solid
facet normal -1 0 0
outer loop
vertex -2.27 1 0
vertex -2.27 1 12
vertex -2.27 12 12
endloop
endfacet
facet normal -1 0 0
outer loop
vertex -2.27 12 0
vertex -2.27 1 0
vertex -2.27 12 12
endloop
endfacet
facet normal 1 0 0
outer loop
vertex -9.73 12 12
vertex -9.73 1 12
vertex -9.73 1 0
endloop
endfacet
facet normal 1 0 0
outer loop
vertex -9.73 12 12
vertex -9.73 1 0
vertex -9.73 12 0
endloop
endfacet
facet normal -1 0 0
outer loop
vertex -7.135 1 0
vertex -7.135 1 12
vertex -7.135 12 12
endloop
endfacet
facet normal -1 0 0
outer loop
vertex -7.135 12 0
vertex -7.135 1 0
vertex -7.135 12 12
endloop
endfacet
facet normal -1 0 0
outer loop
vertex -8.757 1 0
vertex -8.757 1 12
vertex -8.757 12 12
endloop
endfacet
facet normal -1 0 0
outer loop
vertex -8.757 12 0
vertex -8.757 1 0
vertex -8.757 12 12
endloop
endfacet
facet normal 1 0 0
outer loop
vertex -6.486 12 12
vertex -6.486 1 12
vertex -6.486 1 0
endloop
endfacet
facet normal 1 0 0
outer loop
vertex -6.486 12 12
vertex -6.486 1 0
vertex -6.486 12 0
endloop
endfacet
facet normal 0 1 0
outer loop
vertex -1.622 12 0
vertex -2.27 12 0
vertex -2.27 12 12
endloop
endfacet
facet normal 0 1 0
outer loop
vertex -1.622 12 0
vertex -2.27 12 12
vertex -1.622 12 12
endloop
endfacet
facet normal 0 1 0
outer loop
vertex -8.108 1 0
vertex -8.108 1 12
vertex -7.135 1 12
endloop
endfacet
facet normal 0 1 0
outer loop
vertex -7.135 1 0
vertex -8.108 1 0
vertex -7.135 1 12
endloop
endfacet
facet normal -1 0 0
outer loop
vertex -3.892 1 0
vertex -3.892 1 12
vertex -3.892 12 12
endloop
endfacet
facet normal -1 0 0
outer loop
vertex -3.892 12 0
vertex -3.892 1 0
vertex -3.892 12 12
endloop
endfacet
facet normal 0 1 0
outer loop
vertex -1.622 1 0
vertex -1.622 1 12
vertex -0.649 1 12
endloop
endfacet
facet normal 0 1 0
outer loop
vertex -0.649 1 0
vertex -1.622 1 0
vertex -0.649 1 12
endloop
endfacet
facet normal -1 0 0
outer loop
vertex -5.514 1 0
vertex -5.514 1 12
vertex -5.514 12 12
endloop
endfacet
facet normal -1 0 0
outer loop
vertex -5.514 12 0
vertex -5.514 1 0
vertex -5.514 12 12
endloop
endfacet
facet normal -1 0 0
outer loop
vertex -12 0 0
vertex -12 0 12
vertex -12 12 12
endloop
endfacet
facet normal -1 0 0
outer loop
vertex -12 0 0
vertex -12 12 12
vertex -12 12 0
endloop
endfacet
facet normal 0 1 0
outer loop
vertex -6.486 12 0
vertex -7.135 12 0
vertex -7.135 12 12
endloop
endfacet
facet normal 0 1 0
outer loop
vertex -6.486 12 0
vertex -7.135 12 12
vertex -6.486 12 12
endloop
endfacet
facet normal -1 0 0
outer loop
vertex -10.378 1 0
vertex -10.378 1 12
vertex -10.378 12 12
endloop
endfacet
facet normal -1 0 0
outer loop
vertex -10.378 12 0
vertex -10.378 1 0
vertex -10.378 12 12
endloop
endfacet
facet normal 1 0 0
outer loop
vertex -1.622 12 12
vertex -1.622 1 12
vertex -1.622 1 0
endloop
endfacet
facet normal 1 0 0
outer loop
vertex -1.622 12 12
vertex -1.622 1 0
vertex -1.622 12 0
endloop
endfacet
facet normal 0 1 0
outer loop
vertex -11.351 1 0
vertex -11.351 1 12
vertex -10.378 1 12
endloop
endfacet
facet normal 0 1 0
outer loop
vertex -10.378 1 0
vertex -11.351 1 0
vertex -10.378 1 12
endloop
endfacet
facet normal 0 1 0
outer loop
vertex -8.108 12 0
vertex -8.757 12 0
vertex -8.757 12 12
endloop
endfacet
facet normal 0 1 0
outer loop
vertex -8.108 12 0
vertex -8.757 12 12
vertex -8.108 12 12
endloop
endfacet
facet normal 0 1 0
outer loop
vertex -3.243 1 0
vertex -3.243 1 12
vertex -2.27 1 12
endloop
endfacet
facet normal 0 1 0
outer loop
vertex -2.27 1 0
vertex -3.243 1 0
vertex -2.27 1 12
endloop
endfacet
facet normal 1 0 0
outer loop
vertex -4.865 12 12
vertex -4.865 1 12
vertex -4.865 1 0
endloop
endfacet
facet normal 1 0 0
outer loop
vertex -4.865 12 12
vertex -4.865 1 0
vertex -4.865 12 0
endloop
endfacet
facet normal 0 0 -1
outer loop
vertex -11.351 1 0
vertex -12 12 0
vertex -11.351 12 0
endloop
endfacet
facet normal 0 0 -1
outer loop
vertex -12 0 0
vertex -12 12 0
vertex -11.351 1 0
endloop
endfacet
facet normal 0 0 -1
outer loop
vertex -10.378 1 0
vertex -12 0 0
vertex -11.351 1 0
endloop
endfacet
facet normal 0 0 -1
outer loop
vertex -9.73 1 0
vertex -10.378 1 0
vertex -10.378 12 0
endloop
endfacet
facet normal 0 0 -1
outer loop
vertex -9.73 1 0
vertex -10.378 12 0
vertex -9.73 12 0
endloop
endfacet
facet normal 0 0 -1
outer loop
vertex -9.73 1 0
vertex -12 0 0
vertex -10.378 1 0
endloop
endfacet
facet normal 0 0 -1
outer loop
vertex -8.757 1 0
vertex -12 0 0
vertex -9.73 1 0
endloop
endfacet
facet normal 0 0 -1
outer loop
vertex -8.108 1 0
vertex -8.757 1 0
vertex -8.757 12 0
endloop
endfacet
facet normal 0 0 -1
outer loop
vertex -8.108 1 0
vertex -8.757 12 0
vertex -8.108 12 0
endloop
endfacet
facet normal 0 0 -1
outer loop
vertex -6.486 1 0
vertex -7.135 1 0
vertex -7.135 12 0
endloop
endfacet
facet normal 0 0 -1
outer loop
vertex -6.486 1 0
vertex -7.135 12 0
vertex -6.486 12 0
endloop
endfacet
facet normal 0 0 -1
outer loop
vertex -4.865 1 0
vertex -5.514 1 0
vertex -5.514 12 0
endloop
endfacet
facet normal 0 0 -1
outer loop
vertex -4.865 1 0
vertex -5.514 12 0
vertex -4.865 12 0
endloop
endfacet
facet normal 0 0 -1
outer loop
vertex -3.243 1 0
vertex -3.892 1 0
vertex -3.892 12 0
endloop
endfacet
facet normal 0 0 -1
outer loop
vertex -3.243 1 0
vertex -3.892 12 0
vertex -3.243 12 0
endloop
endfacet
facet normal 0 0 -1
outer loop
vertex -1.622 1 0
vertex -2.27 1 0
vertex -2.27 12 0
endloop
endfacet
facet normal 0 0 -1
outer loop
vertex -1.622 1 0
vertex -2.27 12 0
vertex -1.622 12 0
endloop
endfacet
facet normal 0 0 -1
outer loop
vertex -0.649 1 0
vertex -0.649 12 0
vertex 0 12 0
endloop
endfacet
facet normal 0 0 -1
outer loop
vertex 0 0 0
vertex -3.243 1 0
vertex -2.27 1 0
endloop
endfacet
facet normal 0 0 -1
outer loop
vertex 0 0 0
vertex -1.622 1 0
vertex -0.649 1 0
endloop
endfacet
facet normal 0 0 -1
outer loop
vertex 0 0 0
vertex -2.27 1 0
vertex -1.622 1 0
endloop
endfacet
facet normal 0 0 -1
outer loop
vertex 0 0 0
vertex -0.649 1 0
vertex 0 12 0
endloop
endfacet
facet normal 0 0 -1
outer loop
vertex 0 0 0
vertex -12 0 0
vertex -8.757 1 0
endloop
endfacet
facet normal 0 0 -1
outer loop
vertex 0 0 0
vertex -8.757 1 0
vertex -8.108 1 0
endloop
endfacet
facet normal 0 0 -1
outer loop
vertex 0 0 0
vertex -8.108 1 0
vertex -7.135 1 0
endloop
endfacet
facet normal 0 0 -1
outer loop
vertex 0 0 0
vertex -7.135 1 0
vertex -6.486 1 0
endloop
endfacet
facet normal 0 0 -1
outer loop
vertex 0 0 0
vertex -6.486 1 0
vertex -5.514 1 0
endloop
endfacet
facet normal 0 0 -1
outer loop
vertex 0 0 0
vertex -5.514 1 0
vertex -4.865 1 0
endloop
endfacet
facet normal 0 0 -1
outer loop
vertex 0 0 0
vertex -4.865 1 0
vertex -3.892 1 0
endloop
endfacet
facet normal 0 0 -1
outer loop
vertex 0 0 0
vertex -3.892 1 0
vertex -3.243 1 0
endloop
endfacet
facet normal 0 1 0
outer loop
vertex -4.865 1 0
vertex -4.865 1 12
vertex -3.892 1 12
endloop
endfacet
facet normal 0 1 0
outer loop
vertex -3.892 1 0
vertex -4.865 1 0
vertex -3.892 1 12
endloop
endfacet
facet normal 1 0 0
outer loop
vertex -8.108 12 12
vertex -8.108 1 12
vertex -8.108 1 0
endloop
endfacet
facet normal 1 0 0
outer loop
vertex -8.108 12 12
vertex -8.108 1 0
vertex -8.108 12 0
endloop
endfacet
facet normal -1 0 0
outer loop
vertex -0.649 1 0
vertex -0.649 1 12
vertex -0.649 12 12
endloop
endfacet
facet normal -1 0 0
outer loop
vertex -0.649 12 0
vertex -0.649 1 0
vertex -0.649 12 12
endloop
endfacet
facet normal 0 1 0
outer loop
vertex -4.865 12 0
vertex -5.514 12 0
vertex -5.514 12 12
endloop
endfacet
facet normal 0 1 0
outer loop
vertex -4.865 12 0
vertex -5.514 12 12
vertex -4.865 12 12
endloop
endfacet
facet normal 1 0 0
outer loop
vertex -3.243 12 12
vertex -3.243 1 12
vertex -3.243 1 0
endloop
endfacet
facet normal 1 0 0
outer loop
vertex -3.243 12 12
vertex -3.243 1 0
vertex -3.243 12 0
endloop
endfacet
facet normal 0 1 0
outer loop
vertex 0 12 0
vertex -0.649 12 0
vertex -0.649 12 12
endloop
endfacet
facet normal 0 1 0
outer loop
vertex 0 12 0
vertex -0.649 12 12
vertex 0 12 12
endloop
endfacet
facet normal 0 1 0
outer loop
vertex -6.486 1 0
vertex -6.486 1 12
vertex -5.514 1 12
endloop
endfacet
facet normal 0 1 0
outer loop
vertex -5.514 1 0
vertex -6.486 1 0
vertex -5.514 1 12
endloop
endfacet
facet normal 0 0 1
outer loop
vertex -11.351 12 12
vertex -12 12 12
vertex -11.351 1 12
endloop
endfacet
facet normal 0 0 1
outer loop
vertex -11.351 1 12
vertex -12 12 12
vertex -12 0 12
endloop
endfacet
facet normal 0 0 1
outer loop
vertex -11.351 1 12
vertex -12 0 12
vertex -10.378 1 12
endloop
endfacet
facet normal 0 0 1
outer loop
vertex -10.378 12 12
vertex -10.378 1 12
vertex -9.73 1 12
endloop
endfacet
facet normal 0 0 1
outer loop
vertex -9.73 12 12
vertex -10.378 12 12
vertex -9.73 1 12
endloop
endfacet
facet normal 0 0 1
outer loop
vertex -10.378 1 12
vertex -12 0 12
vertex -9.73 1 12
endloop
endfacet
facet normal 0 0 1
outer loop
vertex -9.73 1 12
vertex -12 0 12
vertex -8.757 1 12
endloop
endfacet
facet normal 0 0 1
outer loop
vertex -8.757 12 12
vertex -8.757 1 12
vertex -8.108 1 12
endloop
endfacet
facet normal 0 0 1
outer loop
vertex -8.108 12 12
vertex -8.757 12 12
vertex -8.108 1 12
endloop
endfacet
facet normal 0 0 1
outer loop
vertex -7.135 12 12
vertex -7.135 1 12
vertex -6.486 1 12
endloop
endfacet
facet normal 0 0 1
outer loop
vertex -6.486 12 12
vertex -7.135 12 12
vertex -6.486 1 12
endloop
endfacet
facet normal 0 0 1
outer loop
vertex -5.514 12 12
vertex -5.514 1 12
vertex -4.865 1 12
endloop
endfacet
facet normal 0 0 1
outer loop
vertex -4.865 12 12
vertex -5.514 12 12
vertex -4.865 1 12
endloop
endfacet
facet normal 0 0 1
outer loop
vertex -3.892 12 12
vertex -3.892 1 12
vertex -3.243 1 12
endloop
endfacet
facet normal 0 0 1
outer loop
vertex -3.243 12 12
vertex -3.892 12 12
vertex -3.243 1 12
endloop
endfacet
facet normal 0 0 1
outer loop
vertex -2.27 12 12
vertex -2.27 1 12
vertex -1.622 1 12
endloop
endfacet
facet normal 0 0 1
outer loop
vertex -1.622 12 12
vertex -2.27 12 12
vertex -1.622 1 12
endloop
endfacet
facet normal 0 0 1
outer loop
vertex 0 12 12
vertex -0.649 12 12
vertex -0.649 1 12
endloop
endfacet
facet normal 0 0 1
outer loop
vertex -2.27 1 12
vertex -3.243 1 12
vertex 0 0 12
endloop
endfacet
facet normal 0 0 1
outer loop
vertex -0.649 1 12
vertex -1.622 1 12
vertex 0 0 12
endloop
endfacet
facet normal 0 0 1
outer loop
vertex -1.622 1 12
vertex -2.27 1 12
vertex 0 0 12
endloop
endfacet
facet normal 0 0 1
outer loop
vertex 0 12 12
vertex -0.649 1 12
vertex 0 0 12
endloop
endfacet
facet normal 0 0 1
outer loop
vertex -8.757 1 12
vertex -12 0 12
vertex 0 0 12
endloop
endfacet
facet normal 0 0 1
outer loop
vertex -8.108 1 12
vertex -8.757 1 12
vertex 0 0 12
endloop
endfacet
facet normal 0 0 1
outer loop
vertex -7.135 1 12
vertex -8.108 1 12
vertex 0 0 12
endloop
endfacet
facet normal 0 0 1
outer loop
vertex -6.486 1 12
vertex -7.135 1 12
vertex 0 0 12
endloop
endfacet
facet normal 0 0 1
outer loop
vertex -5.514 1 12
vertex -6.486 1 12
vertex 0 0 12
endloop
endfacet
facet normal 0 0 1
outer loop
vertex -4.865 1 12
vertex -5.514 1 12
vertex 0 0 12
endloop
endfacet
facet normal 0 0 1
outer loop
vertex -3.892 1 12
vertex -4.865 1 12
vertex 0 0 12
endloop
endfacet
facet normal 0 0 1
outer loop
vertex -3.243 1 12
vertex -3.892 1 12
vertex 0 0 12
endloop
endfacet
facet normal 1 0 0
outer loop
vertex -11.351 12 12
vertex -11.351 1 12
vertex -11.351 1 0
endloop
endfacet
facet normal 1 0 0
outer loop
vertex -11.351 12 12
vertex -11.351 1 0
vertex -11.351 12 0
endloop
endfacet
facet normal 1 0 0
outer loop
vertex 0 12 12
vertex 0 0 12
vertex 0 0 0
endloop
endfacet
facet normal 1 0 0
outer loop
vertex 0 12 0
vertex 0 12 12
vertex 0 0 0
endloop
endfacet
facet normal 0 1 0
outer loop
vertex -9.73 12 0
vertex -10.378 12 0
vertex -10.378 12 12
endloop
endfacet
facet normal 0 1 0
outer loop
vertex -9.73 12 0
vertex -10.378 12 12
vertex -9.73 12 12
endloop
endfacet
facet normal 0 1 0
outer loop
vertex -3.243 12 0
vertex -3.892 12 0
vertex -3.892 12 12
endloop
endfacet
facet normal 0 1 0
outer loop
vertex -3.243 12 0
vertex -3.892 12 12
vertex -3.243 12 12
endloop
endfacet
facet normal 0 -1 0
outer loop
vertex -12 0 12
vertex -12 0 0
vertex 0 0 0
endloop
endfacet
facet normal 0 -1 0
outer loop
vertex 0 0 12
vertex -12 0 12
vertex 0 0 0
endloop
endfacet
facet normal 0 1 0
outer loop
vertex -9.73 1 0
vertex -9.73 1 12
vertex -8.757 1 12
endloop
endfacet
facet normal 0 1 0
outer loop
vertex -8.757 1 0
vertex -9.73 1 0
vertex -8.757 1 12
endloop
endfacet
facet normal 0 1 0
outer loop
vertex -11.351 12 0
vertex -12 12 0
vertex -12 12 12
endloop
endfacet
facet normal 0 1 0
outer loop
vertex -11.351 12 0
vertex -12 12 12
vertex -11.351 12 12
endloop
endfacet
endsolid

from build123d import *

# Parameters (mm, degrees)
SKETCH1_W           = 12
SKETCH1_H           = 12
BOSS_EXTRUDE1_DEPTH = 12
SKETCH2_W           = 0.972972973
SKETCH2_H           = 11
CUT_EXTRUDE1_DEPTH  = 21.784609691
LPATTERN1_COUNT     = 7
LPATTERN1_PITCH     = 1.621621622


with BuildPart() as part:
    # Sketch1 → Boss-Extrude1 (new body)
    with BuildSketch(Plane(origin=(0, 0, 0), x_dir=(1, 0, 0), z_dir=(0, 1, 0))):
        with Locations((-6, -6)):
            Rectangle(SKETCH1_W, SKETCH1_H)
    extrude(amount=BOSS_EXTRUDE1_DEPTH)

    # Sketch2 → Cut-Extrude1 (cut, through all)
    with BuildSketch(Plane.XY.offset(12)):
        with Locations((-10.864864864, 6.5)):
            Rectangle(SKETCH2_W, SKETCH2_H)
    cut_extrude1 = extrude(amount=-CUT_EXTRUDE1_DEPTH, mode=Mode.SUBTRACT)

    # LPattern1: Cut-Extrude1 ×7
    with Locations(*[(i * LPATTERN1_PITCH, 0, 0) for i in range(1, LPATTERN1_COUNT)]):
        add(cut_extrude1, mode=Mode.SUBTRACT)


solid = part.part
